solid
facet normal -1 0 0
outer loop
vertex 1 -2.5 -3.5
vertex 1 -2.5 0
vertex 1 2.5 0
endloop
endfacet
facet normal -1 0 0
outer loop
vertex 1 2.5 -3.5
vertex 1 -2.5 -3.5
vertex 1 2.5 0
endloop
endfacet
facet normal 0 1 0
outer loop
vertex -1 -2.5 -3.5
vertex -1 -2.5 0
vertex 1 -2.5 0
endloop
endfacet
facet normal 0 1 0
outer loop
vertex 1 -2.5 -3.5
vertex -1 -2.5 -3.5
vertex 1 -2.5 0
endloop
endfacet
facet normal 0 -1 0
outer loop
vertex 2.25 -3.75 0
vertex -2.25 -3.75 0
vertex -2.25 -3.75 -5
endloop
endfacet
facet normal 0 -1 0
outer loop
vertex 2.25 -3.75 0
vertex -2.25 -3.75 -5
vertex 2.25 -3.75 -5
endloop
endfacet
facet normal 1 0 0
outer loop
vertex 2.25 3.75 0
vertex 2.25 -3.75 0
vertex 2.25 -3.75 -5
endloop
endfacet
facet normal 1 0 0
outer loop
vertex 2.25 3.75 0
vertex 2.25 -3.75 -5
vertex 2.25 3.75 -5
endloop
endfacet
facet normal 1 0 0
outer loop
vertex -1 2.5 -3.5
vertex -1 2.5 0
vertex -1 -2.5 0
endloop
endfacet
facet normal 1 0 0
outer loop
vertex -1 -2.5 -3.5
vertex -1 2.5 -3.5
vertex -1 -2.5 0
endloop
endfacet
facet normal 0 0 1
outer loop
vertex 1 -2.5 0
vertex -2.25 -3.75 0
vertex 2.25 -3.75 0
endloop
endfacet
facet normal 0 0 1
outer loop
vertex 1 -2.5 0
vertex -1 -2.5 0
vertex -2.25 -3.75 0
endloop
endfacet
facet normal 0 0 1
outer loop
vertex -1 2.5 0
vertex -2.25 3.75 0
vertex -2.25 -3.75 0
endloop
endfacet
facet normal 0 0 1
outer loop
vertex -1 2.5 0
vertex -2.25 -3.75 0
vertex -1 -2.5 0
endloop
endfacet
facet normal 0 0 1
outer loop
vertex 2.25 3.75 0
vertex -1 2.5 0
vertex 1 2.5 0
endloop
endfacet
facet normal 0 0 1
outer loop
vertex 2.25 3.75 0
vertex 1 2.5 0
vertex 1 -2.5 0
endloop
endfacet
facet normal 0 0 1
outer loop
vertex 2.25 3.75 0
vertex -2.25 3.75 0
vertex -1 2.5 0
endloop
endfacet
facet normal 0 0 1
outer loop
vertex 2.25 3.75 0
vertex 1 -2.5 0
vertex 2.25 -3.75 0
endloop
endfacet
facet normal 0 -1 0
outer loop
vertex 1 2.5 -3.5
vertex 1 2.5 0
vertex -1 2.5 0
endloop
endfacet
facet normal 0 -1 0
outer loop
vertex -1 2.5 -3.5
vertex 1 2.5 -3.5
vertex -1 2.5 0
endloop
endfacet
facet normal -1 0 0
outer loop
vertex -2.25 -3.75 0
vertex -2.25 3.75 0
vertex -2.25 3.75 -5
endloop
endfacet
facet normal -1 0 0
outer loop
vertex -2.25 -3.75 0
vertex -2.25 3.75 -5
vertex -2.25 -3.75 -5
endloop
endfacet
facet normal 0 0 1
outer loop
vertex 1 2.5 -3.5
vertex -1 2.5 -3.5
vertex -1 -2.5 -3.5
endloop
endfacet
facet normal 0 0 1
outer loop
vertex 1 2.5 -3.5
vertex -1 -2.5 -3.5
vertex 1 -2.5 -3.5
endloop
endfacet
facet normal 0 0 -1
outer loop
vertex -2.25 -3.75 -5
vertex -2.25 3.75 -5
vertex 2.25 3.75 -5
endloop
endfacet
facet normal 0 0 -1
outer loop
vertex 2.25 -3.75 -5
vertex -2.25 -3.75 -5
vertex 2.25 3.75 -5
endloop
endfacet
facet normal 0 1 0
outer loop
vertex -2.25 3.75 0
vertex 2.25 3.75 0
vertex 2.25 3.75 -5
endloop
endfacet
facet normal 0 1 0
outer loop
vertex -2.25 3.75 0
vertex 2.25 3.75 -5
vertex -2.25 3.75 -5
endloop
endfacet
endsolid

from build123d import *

# Parameters (mm, degrees)
F0_W     = 2.25
F0_H     = 3.75
F1_DEPTH = 5
F2_W     = 1
F2_H     = 2.5
F3_DEPTH = 3.5


with BuildPart() as f1:
    # F0 (on Top) → F1 (new body)
    with BuildSketch(Plane.XY):
        with Locations((1.125, 1.875)):
            Rectangle(F0_W, F0_H)
        with Locations((-1.125, 1.875)):
            Rectangle(F0_W, F0_H)
        Polygon((2.25, 0), (0, 0), (-2.25, 0), (-2.25, -3.75), (0, -3.75), (2.25, -3.75), align=None)
    extrude(amount=-F1_DEPTH)

    # F2 (on face) → F3 (cut)
    with BuildSketch(Plane.XY):
        with Locations((0.5, 1.25)):
            Rectangle(F2_W, F2_H)
        with Locations((-0.5, 1.25)):
            Rectangle(F2_W, F2_H)
        Polygon((1, 0), (0, 0), (-1, 0), (-1, -2.5), (0, -2.5), (1, -2.5), align=None)
    extrude(amount=-F3_DEPTH, mode=Mode.SUBTRACT)


solid = f1.part
